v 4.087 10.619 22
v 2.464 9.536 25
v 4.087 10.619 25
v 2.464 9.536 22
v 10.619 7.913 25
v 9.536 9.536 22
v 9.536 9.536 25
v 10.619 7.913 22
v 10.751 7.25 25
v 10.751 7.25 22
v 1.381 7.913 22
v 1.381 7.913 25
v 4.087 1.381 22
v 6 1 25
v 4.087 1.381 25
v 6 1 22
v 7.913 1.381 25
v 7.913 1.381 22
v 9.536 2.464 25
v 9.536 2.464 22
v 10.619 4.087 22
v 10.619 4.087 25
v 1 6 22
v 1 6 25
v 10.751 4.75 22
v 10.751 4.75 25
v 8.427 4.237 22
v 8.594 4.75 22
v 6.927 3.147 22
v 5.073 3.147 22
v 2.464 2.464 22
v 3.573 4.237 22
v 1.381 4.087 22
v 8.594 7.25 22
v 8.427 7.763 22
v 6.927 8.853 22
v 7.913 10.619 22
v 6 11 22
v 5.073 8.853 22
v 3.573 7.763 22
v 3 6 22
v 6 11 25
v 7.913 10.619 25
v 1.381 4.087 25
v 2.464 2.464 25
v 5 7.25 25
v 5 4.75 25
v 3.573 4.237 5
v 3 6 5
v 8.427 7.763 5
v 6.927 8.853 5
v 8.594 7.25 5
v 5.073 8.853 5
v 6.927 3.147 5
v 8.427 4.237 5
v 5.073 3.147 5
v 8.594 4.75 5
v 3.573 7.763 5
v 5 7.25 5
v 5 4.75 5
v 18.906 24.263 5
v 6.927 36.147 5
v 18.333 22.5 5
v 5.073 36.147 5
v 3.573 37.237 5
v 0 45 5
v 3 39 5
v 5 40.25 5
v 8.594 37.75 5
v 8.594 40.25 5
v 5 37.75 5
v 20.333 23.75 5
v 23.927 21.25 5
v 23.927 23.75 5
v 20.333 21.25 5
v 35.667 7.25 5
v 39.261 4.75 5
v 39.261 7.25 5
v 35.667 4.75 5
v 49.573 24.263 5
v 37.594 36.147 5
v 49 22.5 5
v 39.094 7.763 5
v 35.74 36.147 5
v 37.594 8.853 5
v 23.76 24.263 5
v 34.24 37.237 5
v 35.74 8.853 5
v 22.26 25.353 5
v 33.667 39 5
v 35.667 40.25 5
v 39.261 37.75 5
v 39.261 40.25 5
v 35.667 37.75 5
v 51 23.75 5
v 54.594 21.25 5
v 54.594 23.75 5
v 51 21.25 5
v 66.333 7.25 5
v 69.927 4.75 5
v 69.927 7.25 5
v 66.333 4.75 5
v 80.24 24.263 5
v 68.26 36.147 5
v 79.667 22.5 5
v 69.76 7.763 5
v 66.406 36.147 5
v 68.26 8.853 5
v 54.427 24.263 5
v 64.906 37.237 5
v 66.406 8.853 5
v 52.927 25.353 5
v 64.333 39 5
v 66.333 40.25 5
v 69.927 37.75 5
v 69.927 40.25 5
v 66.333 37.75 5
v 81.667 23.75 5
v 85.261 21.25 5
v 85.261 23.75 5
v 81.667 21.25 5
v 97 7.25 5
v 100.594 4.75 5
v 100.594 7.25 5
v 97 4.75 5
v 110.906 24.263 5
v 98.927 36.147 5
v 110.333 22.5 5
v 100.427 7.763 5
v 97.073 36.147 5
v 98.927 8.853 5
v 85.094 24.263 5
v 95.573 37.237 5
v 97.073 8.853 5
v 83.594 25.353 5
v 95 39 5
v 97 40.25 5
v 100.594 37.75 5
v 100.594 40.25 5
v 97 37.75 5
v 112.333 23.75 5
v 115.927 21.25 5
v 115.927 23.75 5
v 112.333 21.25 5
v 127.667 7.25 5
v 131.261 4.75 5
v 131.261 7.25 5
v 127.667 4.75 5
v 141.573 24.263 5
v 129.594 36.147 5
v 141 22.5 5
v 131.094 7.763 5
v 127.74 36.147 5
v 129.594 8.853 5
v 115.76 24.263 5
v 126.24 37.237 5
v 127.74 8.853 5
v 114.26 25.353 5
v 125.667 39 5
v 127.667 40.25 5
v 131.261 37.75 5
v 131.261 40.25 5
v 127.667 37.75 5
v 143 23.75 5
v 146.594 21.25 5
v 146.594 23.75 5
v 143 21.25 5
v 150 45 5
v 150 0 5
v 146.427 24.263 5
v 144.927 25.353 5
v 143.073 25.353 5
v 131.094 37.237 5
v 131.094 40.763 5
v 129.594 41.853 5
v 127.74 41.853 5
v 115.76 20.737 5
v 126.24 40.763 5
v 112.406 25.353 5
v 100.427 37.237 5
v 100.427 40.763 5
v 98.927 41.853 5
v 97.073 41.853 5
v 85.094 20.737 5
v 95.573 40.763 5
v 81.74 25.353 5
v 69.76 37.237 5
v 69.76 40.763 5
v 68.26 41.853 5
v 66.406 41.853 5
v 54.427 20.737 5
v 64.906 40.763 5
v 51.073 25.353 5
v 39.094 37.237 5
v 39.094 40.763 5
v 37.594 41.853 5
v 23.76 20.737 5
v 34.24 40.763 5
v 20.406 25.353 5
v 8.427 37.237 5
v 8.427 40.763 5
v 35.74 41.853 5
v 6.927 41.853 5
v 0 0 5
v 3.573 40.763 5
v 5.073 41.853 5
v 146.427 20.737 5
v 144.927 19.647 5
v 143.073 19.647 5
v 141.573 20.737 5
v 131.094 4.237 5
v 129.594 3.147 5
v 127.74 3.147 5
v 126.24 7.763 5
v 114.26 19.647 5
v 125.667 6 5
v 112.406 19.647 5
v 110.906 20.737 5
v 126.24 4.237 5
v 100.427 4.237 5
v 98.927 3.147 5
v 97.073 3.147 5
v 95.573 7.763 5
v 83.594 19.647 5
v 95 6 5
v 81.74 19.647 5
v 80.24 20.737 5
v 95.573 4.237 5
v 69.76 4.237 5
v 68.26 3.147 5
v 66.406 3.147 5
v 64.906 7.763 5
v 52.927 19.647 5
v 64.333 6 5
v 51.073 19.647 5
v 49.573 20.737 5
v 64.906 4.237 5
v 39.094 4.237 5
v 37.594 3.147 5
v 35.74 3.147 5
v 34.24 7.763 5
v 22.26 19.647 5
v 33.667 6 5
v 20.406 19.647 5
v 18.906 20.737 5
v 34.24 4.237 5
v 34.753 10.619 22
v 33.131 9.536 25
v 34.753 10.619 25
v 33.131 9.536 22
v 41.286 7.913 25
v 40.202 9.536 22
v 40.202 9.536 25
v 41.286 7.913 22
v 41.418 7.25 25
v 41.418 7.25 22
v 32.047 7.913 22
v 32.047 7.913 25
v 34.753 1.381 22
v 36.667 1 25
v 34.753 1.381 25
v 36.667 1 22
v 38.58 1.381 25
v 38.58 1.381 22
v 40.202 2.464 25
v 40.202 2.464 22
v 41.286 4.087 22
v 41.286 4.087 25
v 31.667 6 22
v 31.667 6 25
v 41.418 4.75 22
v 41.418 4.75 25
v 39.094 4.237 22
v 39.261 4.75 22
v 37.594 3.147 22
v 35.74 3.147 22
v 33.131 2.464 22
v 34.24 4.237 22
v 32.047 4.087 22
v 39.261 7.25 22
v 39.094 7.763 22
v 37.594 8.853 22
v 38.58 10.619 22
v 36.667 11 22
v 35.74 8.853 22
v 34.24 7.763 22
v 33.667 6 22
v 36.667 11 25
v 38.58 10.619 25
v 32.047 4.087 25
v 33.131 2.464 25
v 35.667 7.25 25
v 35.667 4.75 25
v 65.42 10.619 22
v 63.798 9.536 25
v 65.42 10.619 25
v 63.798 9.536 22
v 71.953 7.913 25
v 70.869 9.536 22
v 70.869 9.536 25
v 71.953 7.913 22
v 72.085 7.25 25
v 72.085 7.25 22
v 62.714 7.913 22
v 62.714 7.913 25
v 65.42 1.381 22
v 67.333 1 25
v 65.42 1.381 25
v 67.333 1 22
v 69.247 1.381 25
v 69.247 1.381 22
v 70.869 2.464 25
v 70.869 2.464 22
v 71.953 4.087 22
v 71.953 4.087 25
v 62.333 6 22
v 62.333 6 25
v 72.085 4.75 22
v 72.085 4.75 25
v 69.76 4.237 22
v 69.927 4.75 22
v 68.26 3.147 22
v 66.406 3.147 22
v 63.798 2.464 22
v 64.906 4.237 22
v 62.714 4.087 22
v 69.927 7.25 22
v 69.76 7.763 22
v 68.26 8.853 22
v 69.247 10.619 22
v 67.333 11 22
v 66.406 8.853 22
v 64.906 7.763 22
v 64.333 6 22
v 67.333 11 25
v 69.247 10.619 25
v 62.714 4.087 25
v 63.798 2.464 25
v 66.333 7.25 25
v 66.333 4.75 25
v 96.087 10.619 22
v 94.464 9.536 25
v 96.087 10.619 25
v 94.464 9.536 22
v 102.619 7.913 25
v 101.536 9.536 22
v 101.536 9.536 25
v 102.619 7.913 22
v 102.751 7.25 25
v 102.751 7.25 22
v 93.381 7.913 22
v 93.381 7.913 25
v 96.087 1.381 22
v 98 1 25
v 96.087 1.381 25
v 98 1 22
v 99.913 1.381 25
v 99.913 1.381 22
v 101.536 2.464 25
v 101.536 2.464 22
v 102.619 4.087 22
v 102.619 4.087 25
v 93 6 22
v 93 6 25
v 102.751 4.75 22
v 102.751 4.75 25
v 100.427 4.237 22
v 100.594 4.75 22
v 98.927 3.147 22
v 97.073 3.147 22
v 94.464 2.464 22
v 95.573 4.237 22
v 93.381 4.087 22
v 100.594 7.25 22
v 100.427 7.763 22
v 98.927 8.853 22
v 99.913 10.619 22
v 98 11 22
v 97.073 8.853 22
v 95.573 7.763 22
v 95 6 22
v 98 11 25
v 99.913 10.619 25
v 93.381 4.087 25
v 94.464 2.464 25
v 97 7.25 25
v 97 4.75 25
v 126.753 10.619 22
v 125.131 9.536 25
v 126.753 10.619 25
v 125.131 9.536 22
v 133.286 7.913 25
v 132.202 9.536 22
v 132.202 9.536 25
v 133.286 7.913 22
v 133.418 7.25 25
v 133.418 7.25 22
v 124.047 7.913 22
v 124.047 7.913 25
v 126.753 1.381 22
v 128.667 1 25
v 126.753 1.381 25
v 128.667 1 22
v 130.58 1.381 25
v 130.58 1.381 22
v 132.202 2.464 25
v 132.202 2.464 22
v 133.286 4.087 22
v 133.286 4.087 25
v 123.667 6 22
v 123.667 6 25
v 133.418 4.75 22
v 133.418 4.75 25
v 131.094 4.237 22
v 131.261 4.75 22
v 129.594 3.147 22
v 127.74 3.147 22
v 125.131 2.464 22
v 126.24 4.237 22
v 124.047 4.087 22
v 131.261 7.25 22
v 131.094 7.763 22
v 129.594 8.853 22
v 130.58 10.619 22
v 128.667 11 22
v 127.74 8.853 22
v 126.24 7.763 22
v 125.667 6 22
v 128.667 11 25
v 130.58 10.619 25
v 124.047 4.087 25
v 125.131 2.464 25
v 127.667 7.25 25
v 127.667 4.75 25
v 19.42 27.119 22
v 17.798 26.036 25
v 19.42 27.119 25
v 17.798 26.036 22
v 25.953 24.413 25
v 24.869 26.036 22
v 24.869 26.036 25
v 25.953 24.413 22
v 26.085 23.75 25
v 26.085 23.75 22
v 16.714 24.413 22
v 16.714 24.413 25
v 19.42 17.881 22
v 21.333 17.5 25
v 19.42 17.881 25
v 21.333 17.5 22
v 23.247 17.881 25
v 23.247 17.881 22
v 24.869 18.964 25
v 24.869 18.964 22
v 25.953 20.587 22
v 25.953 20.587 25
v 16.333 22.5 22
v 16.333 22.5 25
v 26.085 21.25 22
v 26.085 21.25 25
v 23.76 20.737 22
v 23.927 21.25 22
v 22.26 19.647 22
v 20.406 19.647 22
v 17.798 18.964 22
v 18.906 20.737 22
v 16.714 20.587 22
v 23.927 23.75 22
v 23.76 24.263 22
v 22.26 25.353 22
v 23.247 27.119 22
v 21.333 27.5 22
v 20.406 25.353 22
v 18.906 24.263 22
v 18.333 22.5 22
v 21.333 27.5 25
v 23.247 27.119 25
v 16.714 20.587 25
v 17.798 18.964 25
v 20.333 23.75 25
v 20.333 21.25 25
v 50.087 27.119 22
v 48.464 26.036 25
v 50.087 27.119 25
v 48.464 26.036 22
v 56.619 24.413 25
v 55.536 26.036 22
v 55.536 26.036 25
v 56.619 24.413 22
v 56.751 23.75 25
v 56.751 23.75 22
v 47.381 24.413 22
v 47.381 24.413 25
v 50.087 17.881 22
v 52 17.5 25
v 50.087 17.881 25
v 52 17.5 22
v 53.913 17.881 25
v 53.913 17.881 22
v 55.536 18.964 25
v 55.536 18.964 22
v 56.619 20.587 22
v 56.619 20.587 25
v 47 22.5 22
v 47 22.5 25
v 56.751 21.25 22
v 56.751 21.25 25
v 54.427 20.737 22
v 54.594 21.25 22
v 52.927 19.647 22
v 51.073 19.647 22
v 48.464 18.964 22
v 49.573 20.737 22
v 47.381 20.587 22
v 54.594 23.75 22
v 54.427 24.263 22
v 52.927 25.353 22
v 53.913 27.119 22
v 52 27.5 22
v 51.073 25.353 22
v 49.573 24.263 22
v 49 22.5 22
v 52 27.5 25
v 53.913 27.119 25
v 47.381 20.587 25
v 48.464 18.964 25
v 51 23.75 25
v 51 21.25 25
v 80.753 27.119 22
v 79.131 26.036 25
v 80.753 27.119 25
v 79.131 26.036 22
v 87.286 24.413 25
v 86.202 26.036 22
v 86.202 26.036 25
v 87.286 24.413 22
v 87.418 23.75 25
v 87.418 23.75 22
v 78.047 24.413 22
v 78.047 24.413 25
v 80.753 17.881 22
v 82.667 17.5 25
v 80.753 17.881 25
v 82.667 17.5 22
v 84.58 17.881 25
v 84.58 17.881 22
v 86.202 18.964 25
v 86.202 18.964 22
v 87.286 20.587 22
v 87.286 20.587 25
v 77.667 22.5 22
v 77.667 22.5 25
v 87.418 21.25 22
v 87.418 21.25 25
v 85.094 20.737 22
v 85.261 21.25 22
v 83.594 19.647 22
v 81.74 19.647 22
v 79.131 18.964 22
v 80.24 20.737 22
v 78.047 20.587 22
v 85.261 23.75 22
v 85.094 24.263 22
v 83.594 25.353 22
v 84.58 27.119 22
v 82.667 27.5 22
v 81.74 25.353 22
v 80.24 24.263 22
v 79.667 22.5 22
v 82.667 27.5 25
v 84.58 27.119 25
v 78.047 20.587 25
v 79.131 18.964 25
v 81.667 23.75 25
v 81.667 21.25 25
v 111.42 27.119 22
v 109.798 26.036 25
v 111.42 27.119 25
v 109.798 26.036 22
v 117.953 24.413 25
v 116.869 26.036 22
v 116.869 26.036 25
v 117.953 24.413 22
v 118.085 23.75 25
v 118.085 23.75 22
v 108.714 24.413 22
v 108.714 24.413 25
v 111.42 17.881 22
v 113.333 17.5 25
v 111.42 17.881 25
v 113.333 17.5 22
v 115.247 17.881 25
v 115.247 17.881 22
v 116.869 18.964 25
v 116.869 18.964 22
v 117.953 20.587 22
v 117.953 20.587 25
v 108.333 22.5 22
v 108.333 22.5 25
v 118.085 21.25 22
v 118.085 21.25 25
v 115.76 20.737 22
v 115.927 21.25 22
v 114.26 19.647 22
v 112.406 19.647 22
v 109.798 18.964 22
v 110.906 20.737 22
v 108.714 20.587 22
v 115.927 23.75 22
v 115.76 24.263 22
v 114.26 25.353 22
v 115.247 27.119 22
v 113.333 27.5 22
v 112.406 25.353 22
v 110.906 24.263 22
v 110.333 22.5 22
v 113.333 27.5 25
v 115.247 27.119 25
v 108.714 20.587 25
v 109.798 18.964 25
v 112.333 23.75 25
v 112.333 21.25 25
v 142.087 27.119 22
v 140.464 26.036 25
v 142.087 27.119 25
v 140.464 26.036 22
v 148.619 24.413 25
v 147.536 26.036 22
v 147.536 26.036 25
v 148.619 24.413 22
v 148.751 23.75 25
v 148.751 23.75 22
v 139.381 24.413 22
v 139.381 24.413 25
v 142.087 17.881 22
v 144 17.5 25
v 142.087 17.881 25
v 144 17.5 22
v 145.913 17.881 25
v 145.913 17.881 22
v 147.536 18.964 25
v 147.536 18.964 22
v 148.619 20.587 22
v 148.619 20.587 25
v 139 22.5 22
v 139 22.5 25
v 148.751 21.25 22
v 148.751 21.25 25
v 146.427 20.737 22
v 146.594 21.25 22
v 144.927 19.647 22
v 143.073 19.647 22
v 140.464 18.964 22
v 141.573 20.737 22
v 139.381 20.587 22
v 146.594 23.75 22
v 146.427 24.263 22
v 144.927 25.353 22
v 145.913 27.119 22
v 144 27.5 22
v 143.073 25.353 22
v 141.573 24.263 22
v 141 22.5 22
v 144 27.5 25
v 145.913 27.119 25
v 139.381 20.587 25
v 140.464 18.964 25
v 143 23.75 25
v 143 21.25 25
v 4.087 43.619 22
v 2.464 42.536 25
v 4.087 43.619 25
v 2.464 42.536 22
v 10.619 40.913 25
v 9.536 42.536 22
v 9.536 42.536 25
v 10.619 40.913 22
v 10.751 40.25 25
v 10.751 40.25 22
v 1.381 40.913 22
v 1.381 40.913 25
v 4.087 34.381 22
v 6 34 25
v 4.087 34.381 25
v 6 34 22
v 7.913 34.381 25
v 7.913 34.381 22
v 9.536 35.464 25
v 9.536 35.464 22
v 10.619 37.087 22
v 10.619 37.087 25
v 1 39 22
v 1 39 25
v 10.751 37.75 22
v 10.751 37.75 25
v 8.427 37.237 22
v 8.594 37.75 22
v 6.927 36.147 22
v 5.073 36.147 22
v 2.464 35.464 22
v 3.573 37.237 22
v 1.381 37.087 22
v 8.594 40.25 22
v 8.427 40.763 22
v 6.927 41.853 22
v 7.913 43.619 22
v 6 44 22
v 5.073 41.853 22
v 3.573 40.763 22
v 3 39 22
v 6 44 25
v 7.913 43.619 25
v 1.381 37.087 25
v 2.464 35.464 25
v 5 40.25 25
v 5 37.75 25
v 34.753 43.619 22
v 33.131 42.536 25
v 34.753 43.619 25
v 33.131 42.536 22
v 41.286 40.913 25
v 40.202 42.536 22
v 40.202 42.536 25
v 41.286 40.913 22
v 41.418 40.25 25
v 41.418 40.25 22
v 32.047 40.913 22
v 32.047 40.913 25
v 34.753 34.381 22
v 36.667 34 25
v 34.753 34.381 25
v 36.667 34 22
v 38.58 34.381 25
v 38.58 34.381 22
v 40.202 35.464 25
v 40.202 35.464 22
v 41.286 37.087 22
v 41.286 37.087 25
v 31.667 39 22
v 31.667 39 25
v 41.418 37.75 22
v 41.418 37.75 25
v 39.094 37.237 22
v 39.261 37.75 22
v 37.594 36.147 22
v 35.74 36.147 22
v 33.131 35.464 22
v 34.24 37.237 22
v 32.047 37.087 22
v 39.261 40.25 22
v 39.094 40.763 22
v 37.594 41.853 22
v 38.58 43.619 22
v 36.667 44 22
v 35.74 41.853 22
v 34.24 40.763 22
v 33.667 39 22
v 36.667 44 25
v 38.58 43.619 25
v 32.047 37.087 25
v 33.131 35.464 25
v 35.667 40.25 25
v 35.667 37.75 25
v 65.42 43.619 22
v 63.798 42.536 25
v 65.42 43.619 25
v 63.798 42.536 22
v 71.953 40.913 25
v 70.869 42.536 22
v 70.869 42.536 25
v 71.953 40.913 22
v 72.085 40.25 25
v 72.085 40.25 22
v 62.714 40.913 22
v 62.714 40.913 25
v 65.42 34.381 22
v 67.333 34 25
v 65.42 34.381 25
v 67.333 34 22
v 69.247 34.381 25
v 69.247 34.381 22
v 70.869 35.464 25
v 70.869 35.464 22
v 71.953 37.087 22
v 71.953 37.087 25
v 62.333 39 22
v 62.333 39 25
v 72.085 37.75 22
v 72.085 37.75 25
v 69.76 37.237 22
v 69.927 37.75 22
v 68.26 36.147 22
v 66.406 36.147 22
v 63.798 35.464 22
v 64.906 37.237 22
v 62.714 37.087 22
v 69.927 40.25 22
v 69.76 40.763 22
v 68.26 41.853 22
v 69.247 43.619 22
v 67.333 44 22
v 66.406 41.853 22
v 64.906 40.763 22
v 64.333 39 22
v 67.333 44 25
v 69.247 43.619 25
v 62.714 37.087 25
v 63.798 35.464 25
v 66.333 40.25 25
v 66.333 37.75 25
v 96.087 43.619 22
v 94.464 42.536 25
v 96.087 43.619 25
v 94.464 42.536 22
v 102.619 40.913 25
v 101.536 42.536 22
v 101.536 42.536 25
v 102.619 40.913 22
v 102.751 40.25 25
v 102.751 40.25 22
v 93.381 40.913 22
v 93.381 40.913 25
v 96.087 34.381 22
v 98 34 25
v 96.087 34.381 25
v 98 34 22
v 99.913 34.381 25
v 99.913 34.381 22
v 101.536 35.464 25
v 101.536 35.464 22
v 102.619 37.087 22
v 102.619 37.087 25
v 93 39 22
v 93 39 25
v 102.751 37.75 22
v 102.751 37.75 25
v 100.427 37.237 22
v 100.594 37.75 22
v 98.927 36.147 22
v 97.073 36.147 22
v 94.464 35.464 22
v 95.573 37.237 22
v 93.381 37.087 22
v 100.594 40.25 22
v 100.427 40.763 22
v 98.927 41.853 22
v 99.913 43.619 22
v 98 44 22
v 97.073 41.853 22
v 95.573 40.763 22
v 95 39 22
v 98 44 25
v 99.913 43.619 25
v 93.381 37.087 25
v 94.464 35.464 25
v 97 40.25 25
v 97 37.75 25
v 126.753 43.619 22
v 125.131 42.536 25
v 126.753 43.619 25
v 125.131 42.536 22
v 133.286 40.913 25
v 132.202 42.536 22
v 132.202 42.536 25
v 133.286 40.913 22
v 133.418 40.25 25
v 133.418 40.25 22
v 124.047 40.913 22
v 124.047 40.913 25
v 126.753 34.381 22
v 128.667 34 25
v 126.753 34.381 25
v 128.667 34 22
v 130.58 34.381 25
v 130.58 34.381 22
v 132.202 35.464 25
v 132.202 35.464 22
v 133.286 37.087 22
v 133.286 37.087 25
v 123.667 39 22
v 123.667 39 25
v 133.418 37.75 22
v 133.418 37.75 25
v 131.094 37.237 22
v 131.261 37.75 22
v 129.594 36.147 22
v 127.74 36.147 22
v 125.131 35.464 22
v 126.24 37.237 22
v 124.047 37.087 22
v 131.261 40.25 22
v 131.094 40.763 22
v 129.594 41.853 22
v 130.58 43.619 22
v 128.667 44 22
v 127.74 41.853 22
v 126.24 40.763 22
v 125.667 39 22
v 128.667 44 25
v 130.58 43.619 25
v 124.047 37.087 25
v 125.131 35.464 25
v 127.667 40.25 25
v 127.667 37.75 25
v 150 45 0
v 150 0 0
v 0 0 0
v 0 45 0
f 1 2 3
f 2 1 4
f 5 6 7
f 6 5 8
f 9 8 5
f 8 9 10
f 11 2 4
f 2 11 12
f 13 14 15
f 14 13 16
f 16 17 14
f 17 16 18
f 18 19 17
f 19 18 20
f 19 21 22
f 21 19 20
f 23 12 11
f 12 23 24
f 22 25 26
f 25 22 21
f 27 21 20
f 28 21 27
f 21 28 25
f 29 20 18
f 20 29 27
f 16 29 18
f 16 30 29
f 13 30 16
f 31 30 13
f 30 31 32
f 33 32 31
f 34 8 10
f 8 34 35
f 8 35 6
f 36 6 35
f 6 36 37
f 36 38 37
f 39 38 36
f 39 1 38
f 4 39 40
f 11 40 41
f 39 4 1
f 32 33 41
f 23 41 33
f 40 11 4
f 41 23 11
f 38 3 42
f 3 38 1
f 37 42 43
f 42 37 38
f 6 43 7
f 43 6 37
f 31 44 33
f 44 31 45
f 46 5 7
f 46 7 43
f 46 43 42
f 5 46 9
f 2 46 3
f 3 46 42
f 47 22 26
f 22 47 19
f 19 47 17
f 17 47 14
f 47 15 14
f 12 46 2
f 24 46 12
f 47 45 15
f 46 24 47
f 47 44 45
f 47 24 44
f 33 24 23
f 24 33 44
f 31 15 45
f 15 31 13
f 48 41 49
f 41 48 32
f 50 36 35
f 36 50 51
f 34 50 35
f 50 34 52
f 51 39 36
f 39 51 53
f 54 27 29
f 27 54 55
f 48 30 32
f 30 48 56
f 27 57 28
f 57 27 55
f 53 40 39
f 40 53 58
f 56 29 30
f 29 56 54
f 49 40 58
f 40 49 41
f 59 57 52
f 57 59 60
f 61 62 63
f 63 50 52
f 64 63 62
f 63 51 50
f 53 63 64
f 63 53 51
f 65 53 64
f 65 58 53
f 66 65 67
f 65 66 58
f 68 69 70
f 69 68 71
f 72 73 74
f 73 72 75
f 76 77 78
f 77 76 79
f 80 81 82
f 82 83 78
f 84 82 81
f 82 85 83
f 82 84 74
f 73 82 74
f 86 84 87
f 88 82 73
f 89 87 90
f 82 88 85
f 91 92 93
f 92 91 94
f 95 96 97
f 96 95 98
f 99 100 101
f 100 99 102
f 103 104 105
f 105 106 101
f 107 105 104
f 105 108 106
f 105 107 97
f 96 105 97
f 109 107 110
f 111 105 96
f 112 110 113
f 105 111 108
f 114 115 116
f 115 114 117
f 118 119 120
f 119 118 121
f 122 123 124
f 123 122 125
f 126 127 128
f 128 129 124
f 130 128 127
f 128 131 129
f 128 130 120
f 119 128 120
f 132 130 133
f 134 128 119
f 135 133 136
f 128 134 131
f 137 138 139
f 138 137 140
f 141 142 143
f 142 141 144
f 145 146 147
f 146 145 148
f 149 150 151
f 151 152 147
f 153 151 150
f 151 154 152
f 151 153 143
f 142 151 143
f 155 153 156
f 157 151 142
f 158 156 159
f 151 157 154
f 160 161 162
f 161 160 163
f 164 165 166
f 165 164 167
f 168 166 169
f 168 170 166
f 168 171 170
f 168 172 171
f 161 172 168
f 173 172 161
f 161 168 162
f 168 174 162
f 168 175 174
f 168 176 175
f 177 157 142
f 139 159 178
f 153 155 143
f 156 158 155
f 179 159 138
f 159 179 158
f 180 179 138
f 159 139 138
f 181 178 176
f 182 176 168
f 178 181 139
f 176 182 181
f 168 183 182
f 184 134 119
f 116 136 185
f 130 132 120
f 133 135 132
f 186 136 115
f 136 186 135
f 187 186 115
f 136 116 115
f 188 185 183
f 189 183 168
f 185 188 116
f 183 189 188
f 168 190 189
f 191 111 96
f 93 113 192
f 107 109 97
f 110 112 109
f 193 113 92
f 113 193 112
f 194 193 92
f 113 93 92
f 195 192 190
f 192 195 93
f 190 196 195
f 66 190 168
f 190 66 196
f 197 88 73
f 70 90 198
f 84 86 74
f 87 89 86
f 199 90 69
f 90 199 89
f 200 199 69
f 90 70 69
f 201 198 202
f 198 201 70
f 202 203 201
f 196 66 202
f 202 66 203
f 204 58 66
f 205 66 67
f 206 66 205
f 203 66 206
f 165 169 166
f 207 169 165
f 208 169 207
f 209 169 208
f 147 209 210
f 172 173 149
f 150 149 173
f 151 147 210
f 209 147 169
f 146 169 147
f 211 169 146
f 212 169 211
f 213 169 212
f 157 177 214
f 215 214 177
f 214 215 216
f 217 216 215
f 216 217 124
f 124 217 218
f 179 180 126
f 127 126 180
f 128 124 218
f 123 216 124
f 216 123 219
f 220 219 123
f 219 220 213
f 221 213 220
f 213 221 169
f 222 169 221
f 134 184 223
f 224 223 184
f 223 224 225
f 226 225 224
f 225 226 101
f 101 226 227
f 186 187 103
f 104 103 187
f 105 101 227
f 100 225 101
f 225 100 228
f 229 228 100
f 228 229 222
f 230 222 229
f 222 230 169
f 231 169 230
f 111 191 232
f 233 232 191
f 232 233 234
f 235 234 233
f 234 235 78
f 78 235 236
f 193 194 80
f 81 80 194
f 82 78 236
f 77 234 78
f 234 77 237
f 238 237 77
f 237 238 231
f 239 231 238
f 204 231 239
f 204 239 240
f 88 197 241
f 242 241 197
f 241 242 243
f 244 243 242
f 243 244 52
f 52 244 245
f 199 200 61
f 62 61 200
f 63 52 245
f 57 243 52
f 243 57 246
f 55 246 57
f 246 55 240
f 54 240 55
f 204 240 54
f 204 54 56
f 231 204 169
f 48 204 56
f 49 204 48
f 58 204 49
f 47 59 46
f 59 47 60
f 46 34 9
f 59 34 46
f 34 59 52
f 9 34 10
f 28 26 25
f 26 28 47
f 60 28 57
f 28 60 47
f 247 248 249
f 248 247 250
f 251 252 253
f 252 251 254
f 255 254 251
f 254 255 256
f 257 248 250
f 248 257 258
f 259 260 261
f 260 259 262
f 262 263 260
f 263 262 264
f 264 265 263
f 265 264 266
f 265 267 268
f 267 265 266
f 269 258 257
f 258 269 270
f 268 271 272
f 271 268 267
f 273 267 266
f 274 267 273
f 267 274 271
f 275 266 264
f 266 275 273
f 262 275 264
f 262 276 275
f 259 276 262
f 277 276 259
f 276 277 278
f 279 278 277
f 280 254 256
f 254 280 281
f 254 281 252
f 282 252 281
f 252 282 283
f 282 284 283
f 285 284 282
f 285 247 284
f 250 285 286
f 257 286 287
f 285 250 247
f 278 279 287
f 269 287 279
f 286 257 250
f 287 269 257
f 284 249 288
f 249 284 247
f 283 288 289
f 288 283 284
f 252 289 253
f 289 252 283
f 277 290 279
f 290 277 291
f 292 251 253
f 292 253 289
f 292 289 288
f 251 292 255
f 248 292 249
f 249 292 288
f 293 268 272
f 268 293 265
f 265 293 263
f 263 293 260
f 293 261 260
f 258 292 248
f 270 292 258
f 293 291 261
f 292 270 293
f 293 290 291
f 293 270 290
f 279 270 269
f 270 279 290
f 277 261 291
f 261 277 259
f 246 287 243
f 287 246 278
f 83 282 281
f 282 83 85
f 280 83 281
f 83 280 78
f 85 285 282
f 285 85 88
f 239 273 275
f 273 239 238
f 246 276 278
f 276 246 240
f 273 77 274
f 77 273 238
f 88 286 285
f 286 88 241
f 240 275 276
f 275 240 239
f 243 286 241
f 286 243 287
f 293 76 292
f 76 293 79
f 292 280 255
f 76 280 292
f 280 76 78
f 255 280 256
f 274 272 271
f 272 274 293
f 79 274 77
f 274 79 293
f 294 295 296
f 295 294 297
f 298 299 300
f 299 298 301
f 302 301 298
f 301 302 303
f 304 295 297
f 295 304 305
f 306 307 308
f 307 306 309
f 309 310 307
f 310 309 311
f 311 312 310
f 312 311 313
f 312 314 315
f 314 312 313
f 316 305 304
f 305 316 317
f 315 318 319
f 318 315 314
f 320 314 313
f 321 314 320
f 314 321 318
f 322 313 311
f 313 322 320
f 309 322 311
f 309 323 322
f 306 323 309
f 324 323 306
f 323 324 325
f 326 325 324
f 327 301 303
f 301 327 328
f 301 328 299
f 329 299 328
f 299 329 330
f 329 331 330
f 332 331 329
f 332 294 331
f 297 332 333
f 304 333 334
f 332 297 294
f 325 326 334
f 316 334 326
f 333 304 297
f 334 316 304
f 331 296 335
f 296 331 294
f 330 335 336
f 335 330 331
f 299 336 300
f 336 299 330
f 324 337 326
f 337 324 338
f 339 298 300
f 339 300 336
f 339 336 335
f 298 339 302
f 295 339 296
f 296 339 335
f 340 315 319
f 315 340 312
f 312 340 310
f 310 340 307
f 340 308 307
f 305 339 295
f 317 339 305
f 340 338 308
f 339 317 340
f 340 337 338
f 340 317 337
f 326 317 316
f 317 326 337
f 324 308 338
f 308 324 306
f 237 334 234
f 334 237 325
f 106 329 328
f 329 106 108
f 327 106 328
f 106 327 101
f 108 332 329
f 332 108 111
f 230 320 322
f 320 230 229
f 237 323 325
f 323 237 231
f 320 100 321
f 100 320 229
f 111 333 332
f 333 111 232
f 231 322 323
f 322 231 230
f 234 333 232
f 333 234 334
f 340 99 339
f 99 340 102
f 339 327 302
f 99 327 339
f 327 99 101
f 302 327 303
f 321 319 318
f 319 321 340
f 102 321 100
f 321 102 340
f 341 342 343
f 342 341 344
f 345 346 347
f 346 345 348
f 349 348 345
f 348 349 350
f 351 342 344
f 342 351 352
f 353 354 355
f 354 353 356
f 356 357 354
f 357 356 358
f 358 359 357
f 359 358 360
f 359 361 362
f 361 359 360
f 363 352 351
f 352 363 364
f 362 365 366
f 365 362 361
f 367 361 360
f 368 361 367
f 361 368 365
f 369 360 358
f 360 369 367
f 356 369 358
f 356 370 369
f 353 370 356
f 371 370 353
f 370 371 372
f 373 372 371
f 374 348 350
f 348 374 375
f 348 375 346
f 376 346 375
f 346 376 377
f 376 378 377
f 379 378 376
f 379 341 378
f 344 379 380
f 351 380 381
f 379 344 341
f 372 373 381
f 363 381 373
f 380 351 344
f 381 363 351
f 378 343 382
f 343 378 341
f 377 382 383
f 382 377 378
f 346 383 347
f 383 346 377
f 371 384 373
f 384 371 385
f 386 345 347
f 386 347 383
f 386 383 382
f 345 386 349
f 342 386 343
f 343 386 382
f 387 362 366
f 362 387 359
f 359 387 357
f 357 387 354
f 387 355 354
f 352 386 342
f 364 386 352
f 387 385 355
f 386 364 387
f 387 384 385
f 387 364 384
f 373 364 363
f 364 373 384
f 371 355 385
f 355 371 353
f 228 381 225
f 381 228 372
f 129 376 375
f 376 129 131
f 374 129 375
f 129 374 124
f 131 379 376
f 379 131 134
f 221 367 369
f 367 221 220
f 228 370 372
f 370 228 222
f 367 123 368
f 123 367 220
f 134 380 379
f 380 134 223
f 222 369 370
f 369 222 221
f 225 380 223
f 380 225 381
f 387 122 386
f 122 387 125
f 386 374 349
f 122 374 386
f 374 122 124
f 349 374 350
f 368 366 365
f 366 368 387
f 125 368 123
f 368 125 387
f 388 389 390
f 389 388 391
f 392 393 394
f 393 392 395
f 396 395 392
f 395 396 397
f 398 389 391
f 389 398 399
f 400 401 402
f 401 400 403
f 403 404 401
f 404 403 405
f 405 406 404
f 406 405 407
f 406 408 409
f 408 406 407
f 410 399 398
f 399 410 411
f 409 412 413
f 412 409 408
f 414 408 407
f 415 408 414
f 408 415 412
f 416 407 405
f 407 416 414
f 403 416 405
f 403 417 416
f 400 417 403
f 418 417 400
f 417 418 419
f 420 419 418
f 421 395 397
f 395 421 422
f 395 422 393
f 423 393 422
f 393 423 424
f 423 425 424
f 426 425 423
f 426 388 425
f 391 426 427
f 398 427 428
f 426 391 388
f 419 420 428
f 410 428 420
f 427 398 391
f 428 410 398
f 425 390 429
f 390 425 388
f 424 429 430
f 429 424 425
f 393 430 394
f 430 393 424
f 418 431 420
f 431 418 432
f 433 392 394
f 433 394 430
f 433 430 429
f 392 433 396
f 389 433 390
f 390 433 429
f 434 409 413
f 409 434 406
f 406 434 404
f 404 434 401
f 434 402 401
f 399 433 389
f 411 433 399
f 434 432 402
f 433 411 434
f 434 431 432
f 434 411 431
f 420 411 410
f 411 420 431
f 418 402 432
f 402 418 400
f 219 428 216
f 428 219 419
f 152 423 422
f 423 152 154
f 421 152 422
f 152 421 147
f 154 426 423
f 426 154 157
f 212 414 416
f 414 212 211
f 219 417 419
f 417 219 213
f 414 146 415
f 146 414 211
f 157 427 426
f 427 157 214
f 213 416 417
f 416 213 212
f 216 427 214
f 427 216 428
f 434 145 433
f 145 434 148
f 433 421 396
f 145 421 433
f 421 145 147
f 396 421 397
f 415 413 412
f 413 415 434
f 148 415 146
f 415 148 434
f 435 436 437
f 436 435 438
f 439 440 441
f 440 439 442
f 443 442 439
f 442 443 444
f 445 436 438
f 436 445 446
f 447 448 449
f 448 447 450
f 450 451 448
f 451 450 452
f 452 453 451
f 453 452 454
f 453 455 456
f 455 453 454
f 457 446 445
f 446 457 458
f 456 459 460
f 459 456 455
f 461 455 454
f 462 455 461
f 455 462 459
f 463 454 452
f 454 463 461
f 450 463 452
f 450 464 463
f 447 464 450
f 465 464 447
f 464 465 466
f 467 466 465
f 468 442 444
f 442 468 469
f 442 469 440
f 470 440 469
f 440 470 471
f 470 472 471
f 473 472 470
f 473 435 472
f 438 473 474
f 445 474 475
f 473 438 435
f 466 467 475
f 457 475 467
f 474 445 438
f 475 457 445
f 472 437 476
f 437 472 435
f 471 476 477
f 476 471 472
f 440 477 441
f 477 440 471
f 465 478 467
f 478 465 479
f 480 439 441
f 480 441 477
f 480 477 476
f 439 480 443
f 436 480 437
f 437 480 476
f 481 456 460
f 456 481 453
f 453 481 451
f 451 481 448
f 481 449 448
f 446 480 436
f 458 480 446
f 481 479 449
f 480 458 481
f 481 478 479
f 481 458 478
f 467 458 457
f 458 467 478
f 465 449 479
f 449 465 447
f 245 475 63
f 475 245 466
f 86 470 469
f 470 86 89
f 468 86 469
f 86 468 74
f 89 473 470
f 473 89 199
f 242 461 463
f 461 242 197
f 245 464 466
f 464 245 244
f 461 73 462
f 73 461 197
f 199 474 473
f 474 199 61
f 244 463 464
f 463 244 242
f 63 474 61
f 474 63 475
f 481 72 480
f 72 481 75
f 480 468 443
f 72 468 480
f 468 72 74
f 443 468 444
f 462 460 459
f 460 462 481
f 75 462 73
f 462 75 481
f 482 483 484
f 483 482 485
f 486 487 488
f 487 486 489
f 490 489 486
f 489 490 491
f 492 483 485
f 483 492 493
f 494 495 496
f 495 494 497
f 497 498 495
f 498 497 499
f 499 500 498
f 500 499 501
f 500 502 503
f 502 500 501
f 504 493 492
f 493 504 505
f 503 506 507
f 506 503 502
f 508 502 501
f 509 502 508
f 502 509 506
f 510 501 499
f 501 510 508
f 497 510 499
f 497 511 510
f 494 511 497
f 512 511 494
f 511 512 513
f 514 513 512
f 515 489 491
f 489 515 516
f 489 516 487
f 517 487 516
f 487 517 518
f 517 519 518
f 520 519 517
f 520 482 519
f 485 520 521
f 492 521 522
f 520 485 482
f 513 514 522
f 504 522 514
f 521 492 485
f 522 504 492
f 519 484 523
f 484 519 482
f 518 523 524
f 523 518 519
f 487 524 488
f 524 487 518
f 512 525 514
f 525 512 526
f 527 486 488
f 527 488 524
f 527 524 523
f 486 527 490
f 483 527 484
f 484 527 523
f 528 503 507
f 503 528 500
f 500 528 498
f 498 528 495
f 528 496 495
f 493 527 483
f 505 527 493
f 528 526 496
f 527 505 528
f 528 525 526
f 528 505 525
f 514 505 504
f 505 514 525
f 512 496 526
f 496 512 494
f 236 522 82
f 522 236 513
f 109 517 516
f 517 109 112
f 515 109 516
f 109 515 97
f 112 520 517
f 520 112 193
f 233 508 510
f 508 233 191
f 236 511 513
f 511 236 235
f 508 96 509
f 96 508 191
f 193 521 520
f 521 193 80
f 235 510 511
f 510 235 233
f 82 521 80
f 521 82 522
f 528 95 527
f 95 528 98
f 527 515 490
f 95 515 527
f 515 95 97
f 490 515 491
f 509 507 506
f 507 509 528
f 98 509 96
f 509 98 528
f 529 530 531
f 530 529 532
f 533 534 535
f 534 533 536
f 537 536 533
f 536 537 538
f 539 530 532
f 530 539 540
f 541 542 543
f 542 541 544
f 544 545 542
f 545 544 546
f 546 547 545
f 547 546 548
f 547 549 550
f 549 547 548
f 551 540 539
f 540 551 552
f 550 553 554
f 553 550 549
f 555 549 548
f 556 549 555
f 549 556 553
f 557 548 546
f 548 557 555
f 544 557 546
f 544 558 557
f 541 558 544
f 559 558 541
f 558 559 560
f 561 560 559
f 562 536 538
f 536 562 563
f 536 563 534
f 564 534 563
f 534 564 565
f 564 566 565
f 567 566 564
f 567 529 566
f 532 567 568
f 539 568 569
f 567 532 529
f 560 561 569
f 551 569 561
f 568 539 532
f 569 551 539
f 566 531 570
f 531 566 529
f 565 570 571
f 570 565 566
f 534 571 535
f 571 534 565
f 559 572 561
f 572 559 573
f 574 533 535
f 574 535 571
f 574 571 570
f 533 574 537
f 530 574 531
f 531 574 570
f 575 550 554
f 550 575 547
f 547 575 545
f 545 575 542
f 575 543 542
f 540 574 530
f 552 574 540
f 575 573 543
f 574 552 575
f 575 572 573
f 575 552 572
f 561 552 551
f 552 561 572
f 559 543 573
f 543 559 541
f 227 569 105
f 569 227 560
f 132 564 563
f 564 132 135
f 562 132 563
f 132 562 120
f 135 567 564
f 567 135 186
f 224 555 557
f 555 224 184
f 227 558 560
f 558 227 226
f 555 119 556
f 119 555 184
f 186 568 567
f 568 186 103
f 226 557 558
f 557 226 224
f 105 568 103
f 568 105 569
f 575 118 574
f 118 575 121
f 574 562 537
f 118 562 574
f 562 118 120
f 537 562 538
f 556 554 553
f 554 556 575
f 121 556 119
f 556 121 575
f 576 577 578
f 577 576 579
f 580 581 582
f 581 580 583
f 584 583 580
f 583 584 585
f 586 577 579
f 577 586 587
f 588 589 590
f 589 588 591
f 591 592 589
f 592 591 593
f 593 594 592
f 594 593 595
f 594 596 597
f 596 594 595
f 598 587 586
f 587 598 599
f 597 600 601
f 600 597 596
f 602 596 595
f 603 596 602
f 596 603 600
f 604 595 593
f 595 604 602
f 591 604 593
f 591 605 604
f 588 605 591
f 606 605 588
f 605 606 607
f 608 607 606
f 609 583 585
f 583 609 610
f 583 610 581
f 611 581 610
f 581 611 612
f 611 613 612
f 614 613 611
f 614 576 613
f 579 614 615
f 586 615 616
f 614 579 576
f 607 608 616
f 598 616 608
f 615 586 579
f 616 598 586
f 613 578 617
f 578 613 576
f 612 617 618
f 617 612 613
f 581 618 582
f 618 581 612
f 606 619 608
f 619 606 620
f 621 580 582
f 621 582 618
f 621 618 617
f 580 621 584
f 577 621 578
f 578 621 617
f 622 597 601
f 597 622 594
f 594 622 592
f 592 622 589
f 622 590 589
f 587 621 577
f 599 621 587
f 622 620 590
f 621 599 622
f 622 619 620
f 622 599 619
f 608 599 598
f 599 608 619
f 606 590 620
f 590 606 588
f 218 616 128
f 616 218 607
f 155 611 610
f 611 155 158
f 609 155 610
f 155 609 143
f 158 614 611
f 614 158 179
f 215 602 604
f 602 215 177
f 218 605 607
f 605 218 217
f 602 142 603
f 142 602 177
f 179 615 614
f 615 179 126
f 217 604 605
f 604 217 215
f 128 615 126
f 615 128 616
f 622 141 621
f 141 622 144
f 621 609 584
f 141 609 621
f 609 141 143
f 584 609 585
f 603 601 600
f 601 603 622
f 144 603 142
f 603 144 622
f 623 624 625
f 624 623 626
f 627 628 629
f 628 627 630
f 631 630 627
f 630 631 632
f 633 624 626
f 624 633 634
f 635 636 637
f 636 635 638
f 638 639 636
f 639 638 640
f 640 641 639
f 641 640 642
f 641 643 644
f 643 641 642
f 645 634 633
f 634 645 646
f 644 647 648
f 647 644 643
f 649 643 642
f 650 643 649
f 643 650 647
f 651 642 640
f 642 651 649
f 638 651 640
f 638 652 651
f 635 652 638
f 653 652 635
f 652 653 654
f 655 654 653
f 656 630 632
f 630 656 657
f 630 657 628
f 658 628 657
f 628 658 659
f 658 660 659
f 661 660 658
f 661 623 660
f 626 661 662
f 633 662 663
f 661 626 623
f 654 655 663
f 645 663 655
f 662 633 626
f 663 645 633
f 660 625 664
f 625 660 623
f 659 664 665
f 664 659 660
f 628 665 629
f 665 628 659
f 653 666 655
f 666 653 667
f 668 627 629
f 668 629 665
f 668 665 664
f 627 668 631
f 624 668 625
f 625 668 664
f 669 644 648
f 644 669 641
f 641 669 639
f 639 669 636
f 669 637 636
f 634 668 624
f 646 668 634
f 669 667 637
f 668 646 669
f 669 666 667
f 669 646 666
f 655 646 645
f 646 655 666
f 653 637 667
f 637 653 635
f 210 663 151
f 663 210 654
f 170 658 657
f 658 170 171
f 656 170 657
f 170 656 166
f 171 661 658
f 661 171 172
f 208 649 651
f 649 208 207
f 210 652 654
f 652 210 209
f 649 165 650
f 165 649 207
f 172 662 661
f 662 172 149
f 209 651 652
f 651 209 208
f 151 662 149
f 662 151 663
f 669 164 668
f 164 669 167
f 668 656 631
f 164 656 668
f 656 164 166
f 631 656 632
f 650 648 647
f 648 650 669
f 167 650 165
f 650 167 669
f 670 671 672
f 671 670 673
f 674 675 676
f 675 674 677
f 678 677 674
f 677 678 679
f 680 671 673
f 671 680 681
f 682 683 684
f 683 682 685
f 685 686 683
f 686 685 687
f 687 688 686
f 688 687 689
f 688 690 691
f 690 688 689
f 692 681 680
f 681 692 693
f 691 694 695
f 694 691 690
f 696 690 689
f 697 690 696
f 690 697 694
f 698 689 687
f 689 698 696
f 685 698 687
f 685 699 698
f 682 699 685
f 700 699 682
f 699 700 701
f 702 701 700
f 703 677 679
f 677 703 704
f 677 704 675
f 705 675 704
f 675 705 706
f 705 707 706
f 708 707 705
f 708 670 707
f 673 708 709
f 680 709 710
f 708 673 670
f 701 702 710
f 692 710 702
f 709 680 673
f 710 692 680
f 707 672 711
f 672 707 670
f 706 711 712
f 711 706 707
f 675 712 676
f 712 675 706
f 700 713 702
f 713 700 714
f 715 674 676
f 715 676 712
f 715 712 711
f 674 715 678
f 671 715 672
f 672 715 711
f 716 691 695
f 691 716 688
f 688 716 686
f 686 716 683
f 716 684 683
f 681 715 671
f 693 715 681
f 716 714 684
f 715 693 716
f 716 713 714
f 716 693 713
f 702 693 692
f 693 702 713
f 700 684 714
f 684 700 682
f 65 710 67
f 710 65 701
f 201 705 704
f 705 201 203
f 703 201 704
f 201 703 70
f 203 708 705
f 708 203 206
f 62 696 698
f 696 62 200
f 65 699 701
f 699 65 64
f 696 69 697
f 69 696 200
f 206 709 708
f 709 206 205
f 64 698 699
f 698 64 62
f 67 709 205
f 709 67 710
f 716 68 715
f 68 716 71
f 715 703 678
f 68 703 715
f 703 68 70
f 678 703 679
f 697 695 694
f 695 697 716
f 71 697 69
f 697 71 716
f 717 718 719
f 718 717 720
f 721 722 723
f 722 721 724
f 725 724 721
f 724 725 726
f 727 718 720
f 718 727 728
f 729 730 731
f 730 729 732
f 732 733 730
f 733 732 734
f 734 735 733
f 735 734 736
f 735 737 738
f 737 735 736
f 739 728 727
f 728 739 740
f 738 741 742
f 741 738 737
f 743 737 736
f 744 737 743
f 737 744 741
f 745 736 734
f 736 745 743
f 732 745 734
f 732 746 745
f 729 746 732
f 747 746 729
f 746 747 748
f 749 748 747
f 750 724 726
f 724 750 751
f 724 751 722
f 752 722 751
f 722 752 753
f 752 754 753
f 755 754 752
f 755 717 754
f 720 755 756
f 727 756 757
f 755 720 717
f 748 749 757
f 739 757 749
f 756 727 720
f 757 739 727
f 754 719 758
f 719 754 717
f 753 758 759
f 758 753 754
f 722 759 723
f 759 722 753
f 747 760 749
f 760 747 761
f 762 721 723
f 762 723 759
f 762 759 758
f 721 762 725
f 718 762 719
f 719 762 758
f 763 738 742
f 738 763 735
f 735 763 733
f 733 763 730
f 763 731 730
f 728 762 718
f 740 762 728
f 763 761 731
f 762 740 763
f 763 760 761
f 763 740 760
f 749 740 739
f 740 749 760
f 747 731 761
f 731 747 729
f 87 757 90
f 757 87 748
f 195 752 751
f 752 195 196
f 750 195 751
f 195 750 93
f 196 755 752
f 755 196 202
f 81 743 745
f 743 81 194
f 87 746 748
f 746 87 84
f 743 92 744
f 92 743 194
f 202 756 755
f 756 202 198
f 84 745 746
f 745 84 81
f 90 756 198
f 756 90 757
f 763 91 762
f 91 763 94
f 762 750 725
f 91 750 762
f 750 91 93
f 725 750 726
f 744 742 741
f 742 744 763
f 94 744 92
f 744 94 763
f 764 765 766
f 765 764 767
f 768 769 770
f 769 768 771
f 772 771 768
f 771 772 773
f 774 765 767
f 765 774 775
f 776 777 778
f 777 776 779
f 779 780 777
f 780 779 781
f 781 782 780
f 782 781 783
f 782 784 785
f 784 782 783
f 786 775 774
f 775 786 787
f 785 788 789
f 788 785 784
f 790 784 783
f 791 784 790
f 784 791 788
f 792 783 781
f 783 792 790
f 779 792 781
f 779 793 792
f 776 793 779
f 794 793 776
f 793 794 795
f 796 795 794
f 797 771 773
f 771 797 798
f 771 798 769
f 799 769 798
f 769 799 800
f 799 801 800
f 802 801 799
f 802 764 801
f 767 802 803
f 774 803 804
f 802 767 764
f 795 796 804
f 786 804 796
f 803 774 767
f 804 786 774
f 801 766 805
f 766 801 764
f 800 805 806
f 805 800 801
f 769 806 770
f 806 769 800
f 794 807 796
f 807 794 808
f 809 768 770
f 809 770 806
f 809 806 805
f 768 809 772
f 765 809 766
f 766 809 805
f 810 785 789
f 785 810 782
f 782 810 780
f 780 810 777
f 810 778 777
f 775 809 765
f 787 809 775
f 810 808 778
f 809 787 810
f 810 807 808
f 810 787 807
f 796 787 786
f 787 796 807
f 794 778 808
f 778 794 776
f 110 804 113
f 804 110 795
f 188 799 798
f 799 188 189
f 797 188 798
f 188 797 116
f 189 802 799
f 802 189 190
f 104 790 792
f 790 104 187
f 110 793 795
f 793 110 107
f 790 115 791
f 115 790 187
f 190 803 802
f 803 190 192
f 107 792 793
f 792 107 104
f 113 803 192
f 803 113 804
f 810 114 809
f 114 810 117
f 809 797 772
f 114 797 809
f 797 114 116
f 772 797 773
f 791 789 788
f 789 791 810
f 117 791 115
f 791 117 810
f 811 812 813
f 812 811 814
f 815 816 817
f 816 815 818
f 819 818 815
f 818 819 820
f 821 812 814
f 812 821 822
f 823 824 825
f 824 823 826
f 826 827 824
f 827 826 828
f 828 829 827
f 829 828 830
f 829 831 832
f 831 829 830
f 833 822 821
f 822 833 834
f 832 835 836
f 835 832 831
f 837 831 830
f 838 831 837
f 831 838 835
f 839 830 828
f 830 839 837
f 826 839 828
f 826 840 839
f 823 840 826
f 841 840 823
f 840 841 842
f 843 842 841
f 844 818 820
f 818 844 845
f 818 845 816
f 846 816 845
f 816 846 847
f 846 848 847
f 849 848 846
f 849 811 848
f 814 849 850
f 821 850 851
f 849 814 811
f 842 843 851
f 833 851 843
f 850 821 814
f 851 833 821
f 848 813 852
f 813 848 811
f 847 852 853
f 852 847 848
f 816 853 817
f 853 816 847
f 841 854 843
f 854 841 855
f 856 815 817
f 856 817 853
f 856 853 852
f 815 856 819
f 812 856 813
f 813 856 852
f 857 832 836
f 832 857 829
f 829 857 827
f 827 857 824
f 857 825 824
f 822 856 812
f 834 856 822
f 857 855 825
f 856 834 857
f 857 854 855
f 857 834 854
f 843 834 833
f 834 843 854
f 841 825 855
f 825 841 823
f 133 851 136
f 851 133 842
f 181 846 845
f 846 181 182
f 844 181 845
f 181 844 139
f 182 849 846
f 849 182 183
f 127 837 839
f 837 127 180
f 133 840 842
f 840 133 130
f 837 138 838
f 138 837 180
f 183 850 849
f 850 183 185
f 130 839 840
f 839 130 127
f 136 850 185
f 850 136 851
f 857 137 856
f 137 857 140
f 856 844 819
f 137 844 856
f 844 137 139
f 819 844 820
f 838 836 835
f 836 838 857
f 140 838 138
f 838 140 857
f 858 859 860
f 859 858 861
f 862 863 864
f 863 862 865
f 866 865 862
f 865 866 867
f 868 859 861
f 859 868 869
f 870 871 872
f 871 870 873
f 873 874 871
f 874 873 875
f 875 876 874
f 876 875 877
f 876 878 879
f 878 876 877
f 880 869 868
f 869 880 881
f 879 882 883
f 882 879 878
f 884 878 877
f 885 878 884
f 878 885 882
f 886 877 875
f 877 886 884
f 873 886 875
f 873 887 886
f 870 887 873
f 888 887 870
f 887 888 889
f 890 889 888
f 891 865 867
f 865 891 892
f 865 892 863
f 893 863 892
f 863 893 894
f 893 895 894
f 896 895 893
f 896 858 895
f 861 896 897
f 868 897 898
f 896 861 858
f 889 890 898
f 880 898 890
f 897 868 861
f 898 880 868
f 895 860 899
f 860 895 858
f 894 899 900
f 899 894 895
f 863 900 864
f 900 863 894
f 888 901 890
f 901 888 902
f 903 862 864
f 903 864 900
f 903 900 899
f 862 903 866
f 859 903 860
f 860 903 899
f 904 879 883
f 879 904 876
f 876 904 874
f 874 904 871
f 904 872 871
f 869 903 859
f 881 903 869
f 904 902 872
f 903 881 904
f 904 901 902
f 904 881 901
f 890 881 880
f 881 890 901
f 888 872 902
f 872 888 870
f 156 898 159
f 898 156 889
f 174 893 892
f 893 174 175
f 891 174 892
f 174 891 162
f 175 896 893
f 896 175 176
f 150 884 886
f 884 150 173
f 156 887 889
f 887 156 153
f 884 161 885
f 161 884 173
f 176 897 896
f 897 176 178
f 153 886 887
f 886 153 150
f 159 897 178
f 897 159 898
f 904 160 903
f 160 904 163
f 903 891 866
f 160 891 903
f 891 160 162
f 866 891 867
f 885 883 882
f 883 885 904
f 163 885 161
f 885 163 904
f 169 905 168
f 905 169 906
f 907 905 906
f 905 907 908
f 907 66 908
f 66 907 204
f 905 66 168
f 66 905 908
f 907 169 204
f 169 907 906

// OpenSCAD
// [FL_INDEX: keywords="openscad, 3d_parametric, Parametric_Rubber_band_loom, csg_solid" | COT="Parametric OpenSCAD design from 3DCodeverse"]
// Title: Parametric Rubber band loom

//Size of base X
base_Y = 45; // [10:500]

//Size of base Y
base_X = 150; // [10:500]

//Thickness of base
base_thickness = 5;

//Peg thickness
peg_thickness = 3; // [1:10]

//Peg height
peg_height = 20; // [10:50]

//Gap width in peg
gap_width = 2.5;

//Number of pegs on X axis
X_pegs = 5;

//Width of step on top of peg
step_width = 2; // [0:5]

//% of peg height for step
step_percent = 15; // [5:90]

module core()
{
translate([0,0,(peg_height+base_thickness)-peg_height*(step_percent/100)])cylinder(peg_height*(step_percent/100),peg_thickness+step_width,peg_thickness+step_width);
translate([0,0,base_thickness])cylinder(peg_height,peg_thickness,peg_thickness);
}

module peg()
{
difference()
{core();
translate([-peg_thickness/3,-gap_width/2,base_thickness])cube([peg_thickness*3,gap_width,peg_height]);
}
}
cube([base_X,base_Y,base_thickness]);
peg_line();
translate([((base_X-peg_thickness*4)/(X_pegs-.5))*.5,((base_Y-peg_thickness*4)/2),0])peg_line();
translate([0,base_Y-(peg_thickness*4),0])peg_line();
module peg_line()
{
for (i = [0 : X_pegs-1] ){
translate([((base_X-peg_thickness*4)/(X_pegs-.5))*(i)+peg_thickness*2,peg_thickness*2,0]) peg();
}
}
